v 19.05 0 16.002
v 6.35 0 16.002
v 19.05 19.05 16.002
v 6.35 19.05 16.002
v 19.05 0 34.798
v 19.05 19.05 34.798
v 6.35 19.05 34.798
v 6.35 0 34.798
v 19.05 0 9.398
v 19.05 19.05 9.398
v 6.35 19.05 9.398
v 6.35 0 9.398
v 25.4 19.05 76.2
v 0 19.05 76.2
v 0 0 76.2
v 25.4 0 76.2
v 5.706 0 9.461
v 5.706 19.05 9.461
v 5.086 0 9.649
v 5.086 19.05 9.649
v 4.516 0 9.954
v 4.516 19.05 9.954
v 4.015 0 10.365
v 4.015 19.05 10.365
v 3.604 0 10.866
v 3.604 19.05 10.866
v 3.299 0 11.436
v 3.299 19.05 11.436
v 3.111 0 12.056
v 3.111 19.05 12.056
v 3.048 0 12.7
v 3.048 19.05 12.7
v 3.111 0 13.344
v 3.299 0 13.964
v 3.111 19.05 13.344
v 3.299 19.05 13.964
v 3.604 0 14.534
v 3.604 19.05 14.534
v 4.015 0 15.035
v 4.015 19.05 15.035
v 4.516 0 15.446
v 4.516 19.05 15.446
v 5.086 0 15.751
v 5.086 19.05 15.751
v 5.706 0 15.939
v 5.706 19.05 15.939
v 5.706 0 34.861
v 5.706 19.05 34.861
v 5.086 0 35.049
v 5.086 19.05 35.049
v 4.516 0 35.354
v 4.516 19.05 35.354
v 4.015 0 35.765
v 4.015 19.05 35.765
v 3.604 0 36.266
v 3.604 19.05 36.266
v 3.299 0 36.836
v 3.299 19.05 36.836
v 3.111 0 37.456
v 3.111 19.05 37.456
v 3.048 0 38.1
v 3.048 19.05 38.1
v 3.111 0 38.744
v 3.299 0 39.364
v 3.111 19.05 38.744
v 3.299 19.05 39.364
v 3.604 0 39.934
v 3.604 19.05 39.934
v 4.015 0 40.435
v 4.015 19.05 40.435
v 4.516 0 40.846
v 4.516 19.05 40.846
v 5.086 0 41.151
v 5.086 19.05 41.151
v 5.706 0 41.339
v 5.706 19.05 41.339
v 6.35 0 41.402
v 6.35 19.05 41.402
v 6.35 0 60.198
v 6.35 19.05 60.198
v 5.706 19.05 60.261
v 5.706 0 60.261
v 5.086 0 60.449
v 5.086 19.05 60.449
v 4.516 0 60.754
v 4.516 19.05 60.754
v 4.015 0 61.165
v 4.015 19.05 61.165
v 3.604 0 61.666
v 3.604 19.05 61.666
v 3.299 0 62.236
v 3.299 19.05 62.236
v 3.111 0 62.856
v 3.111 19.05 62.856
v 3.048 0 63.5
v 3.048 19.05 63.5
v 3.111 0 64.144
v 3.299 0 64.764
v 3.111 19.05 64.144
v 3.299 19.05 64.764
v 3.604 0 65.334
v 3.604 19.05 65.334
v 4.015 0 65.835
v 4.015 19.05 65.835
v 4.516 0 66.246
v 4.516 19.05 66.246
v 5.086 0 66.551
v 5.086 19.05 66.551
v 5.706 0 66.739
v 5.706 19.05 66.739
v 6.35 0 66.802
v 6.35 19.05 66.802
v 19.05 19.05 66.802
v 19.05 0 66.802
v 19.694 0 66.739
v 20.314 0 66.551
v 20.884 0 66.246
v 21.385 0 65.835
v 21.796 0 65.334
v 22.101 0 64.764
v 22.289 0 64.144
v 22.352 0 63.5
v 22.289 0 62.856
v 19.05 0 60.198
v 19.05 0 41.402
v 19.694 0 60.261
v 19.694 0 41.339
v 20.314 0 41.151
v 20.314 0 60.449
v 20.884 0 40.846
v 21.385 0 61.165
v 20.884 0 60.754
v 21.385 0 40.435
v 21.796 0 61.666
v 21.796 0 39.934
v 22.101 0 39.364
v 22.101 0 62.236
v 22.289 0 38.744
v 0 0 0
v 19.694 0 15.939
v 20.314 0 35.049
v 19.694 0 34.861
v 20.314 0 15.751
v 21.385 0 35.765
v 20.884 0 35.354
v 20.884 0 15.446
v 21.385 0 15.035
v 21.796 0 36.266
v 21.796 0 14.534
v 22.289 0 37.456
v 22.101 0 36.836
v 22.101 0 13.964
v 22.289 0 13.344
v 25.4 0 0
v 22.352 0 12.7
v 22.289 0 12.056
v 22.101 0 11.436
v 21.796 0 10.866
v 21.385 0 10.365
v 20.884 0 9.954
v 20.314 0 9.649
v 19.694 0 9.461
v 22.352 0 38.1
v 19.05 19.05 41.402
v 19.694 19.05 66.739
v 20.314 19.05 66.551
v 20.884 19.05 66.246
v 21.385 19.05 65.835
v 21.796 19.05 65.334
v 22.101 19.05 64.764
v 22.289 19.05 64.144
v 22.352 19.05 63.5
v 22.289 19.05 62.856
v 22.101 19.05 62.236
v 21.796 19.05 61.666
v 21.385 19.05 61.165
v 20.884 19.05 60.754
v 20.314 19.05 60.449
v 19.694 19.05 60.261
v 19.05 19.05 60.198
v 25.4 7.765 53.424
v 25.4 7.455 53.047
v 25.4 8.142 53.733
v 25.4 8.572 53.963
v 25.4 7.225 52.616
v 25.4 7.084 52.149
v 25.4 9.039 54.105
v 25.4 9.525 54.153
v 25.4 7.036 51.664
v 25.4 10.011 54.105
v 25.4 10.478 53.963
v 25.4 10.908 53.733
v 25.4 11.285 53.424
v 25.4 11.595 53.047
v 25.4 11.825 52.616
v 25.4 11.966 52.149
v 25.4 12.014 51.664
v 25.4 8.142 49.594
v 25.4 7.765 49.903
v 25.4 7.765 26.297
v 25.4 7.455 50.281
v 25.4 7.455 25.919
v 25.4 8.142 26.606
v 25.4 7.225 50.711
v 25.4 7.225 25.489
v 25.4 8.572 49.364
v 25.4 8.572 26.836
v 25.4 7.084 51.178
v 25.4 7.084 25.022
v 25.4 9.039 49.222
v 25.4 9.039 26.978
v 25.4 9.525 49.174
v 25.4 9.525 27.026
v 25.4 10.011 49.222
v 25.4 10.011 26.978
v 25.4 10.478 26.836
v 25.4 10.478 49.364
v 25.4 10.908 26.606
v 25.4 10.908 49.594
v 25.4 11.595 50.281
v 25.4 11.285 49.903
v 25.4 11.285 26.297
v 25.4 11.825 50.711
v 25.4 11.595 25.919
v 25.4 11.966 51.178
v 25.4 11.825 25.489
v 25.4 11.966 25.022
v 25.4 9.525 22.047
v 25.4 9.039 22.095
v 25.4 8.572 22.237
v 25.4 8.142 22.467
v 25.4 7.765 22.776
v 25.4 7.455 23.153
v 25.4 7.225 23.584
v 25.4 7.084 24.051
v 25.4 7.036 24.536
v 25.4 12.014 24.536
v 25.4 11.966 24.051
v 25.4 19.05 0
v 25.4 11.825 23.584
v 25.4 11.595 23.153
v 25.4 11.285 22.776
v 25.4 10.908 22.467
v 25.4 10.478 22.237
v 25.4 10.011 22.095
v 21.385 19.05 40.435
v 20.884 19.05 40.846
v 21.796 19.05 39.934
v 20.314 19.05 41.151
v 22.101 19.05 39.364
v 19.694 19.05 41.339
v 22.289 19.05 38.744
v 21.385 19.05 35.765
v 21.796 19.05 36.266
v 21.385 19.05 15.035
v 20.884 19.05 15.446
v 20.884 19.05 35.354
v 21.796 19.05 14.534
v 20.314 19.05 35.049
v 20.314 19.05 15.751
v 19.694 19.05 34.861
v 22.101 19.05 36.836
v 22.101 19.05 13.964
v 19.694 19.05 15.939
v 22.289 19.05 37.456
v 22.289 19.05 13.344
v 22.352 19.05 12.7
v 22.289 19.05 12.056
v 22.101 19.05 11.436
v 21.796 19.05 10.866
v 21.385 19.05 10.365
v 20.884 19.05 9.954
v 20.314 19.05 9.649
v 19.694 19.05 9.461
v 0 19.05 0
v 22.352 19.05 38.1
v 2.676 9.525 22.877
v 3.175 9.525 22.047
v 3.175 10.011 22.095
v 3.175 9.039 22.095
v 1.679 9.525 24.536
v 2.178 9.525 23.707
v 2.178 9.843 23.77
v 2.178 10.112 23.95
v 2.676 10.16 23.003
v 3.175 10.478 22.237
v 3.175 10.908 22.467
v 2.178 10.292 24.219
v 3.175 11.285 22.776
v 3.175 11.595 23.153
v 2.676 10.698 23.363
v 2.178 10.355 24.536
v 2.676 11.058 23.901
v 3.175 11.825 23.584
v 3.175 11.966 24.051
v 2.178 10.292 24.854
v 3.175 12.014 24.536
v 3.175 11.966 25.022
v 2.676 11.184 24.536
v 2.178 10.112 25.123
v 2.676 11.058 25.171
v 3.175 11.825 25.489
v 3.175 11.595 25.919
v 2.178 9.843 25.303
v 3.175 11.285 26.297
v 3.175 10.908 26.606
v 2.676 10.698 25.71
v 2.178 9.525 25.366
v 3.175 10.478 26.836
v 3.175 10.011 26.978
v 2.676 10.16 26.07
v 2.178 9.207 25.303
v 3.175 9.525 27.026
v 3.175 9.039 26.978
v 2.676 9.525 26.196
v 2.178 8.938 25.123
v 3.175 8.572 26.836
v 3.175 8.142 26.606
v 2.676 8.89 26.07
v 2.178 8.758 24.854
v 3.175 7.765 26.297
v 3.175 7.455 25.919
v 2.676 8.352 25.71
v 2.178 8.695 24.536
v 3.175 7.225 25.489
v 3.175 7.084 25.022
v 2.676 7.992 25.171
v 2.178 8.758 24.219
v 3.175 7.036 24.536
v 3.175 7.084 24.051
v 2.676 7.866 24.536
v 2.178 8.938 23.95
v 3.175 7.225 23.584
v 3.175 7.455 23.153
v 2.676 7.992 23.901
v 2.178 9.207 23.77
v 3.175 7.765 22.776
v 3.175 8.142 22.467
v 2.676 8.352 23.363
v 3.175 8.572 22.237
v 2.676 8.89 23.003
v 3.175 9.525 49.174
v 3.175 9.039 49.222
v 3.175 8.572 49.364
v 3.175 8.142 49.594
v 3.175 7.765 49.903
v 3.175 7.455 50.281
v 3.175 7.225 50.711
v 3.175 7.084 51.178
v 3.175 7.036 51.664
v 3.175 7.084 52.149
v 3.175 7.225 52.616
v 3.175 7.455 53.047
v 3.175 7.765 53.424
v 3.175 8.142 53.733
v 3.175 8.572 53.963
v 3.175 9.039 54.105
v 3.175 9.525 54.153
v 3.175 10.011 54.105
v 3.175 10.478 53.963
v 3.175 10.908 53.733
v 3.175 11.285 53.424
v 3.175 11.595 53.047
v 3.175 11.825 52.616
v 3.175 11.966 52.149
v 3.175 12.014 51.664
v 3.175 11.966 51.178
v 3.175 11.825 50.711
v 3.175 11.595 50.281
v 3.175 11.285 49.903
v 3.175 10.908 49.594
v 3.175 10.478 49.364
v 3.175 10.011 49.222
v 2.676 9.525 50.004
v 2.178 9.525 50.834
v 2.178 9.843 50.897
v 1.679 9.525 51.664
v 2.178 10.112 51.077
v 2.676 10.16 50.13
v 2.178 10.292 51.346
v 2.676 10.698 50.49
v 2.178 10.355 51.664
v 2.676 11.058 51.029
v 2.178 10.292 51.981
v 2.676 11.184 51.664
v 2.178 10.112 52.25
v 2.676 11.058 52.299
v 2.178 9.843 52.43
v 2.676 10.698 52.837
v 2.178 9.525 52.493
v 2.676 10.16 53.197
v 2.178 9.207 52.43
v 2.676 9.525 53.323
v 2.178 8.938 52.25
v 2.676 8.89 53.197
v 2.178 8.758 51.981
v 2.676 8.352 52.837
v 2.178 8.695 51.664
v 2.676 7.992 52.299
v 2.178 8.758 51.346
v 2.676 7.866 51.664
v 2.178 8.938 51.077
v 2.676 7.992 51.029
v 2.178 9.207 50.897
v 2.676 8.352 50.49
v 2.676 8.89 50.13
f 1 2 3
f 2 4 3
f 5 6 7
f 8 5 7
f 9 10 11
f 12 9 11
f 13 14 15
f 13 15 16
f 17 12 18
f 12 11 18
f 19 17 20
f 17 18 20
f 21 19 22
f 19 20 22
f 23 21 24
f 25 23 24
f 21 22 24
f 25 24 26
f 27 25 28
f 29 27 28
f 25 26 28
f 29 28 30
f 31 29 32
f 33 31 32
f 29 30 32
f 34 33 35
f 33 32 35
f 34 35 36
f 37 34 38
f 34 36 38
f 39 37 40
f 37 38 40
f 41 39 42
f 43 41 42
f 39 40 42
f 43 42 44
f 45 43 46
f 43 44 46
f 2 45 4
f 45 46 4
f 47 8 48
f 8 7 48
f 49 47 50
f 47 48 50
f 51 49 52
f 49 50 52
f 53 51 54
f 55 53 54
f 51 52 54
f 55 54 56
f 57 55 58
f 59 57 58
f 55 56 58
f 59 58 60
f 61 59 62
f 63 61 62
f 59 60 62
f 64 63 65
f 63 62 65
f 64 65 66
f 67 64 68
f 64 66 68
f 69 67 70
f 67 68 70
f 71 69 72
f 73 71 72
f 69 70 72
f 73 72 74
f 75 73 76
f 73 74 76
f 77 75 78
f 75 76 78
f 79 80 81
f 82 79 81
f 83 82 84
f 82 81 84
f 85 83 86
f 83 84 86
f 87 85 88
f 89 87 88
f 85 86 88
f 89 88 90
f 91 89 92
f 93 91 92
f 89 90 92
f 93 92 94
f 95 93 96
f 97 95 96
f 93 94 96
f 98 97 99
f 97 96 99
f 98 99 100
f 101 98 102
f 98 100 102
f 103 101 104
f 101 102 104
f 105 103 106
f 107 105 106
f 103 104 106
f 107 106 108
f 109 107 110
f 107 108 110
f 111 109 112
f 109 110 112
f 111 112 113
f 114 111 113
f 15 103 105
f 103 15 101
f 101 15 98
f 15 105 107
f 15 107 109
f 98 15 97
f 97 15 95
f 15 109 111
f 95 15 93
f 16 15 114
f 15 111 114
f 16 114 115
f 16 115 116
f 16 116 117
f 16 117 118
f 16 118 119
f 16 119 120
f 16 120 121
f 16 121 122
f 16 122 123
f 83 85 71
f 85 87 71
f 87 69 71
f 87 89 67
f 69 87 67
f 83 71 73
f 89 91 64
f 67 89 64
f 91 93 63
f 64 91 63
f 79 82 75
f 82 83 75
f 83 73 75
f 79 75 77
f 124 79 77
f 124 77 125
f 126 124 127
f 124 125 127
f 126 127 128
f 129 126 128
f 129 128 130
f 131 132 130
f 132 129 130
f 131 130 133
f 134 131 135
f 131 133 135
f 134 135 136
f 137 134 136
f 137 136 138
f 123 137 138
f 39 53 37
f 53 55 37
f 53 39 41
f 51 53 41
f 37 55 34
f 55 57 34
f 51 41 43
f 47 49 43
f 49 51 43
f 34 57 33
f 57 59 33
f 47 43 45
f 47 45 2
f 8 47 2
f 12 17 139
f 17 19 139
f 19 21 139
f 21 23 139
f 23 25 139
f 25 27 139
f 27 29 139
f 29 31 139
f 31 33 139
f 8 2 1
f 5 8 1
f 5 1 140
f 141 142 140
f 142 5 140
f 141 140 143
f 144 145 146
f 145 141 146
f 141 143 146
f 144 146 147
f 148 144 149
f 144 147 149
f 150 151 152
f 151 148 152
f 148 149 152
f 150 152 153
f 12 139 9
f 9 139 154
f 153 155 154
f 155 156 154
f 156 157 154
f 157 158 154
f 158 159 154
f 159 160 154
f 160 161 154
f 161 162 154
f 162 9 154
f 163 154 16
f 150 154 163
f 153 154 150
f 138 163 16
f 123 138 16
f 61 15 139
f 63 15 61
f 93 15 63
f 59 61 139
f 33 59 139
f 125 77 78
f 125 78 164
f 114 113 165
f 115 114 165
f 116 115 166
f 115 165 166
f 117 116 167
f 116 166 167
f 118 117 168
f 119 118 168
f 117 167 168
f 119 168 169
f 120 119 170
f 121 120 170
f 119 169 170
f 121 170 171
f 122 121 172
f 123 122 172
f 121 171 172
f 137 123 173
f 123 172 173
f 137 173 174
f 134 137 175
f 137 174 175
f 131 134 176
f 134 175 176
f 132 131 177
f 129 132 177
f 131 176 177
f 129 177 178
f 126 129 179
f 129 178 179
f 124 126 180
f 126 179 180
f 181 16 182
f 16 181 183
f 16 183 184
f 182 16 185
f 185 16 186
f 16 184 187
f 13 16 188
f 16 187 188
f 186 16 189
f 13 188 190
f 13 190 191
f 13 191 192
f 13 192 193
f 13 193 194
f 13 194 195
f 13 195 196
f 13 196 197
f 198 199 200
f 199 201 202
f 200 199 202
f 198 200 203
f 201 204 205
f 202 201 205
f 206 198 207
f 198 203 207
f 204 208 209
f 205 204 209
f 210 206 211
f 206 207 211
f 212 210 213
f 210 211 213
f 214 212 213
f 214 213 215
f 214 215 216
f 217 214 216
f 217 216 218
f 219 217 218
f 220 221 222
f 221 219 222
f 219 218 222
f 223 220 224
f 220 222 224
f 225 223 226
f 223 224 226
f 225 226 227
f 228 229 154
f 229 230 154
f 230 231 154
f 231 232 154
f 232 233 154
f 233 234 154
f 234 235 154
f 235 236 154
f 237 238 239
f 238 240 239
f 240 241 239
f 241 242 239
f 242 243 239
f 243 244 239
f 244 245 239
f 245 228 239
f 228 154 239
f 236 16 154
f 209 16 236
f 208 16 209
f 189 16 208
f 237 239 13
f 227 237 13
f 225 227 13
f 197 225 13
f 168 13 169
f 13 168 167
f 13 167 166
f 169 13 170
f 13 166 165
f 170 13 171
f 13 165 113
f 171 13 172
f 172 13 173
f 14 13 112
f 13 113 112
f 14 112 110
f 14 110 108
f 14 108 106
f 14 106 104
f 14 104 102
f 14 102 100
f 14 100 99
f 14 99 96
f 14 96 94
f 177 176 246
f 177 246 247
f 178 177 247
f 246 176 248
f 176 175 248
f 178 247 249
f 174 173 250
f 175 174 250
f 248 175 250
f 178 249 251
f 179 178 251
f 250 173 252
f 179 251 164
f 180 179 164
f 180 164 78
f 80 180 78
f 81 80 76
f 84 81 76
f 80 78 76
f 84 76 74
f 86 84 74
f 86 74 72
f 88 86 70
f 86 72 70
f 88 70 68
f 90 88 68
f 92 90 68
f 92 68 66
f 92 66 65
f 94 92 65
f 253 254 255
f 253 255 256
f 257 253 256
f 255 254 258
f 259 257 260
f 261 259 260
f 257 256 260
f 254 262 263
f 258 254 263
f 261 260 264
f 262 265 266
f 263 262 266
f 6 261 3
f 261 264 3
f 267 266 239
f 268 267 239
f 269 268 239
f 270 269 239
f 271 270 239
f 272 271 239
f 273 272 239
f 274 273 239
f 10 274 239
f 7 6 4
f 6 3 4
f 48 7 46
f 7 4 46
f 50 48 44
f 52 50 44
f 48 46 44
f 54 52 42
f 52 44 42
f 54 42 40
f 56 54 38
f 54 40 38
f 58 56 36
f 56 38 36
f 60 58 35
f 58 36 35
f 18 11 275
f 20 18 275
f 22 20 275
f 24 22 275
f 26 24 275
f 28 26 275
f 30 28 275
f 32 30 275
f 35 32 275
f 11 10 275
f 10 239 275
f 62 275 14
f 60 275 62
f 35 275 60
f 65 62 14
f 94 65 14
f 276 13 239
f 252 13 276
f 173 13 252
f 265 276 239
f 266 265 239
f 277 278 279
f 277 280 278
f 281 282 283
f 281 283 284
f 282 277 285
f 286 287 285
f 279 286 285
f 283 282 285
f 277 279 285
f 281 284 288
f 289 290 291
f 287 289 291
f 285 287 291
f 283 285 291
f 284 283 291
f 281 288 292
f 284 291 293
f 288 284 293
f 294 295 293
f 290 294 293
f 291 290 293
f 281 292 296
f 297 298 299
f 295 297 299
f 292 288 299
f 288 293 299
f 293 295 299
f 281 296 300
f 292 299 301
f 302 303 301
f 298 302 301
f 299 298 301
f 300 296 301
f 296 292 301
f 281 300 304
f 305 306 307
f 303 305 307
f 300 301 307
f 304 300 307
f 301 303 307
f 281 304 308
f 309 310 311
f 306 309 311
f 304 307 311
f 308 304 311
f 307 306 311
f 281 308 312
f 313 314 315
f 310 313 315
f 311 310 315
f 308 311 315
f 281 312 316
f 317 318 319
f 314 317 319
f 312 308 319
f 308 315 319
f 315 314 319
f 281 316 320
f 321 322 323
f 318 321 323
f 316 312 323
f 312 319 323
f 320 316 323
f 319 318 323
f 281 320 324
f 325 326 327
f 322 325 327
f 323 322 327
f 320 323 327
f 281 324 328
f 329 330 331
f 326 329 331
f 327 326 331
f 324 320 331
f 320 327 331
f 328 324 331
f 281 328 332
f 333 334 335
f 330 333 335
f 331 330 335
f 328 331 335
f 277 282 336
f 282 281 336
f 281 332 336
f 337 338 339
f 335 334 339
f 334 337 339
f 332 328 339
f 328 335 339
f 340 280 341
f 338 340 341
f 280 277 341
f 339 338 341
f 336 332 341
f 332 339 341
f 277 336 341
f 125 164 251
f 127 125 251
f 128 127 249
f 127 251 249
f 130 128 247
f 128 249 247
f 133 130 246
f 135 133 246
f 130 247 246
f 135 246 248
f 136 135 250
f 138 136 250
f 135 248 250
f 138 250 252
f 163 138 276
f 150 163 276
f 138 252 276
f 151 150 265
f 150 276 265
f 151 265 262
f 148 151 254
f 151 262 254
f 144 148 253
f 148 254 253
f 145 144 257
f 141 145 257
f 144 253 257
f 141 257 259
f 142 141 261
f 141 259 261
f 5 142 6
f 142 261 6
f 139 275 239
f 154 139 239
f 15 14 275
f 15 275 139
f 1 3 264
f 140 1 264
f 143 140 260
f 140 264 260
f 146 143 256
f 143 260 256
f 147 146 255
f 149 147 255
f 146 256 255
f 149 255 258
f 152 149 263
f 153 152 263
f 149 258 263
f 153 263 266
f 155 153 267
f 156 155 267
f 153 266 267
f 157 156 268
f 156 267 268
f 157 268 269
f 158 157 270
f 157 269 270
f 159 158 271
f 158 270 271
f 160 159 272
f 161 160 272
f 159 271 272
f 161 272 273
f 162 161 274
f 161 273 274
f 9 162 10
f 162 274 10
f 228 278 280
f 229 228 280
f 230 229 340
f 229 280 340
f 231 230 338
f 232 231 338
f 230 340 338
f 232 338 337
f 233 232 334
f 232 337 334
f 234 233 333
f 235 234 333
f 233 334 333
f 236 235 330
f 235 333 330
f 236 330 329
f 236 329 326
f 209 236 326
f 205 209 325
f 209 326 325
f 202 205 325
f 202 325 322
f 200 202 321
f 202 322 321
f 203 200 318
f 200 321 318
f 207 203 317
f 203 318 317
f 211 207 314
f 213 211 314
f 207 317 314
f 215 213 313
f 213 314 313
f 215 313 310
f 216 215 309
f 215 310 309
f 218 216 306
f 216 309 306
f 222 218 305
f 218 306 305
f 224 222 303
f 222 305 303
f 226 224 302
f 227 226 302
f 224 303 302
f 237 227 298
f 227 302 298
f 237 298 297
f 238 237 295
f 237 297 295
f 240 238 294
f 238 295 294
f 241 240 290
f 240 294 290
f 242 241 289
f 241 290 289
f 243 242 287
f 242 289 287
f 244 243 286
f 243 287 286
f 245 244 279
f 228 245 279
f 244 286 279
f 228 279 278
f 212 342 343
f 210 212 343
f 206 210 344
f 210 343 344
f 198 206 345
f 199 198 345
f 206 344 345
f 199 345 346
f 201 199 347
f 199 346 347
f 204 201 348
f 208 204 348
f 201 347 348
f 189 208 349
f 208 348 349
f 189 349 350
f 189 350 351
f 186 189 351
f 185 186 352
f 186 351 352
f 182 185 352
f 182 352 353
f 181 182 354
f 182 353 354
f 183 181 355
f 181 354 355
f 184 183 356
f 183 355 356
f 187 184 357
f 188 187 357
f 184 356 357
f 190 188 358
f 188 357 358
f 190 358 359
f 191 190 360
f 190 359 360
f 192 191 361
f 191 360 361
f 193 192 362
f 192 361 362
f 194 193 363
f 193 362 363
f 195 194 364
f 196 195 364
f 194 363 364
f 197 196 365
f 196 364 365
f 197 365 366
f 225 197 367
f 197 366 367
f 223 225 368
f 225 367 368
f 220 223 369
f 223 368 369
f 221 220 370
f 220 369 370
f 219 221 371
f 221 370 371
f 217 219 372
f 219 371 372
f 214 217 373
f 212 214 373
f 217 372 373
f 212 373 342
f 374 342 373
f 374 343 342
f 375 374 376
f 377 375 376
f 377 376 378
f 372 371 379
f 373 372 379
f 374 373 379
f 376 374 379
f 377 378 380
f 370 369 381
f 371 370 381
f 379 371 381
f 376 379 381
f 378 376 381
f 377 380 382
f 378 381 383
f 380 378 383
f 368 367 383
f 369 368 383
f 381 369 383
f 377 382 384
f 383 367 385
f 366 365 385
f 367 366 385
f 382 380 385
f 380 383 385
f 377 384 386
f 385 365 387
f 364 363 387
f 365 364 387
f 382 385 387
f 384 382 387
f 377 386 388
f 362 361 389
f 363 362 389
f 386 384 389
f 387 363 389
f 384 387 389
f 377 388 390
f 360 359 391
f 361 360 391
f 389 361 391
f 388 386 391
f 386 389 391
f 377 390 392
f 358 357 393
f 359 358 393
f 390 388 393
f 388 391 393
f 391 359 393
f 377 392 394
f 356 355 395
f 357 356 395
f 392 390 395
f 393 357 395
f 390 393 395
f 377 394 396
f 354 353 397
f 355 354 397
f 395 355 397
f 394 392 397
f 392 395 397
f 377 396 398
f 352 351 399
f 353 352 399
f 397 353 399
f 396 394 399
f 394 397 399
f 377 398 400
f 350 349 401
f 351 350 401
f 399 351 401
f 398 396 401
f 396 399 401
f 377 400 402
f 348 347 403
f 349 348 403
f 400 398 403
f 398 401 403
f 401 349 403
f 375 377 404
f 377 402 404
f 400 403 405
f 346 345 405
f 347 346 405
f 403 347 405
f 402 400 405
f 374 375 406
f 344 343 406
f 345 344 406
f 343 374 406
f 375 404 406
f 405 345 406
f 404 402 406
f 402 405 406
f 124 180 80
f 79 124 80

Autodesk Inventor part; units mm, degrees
ref_plane "YZ Plane" through (0, 0, 0) normal (1, 0, 0) x (0, 1, 0)
ref_plane "XZ Plane" through (0, 0, 0) normal (0, 1, 0) x (-1, 0, 0)
ref_plane "XY Plane" through (0, 0, 0) normal (0, 0, 1) x (1, 0, 0)
sketch "Sketch1" plane through (0, 0, 0) normal (0, 0, 1) x (1, 0, 0)
  line L0 (0, 0) -> (25.4, 0)
  line L1 (25.4, 0) -> (25.4, 19.05)
  line L2 (25.4, 19.05) -> (0, 19.05)
  line L3 (0, 19.05) -> (0, 0)
  dimension "d0" = 25.4
  dimension "d1" = 19.05
extrude "Extrusion1" add sketch "Sketch1" along normal blind 76.2
sketch "Sketch2" plane through (25.4, 0, 0) normal (1, 0, 0) x (0, 0, -1)
  line L0 (0, 0) -> (0, 19.05) projected
  line L1 (0, 19.05) -> (-76.2, 19.05) projected
  point P0 (-51.6636, 9.525)
  point P1 (-24.5364, 9.525)
  dimension "d4" = 27.1272
  dimension "d6" = 9.525
  dimension "d7" = 9.525
  dimension "d29" = 24.5364
hole "Hole1" at (25.4, 9.525, 51.6636) at (25.4, 9.525, 24.5364) direction (-1, 0, 0) diameter 4.9784 depth 22.225 tip angle 118 thread size "1/4-20 UNC" class "2B" standard "ANSI Unified Screw Threads"
sketch "Sketch3" plane through (0, 19.05, 0) normal (0, 1, 0) x (1, 0, 0)
  line L0 (6.35, -12.7) -> (19.05, -12.7) construction
  line L1 (6.35, -16.002) -> (19.05, -16.002)
  line L2 (19.05, -9.398) -> (6.35, -9.398)
  arc A0 (6.35, -9.398) -> (6.35, -16.002) centre (6.35, -12.7) ccw
  arc A1 (19.05, -16.002) -> (19.05, -9.398) centre (19.05, -12.7) ccw
  line L3 (6.35, -63.5) -> (19.05, -63.5) construction
  line L4 (6.35, -66.802) -> (19.05, -66.802)
  line L5 (19.05, -60.198) -> (6.35, -60.198)
  arc A2 (6.35, -60.198) -> (6.35, -66.802) centre (6.35, -63.5) ccw
  arc A3 (19.05, -66.802) -> (19.05, -60.198) centre (19.05, -63.5) ccw
  line L6 (6.35, -38.1) -> (19.05, -38.1) construction
  line L7 (6.35, -41.402) -> (19.05, -41.402)
  line L8 (19.05, -34.798) -> (6.35, -34.798)
  arc A4 (6.35, -34.798) -> (6.35, -41.402) centre (6.35, -38.1) ccw
  arc A5 (19.05, -41.402) -> (19.05, -34.798) centre (19.05, -38.1) ccw
  line L9 (25.4, 0) -> (25.4, -76.2) projected
  line L10 (25.4, -76.2) -> (0, -76.2) projected
  point P0 (12.7, -12.7)
  point P1 (12.7, -63.5)
  point P2 (12.7, -38.1)
  dimension "d15" = 3.302
  dimension "d16" = 3.302
  dimension "d17" = 3.302
  dimension "d18" = 12.7
  dimension "d19" = 12.7
  dimension "d20" = 12.7
  dimension "d21" = 25.4
  dimension "d22" = 25.4
  dimension "d23" = 6.35
  dimension "d24" = 6.35
  dimension "d25" = 6.35
  dimension "d26" = 12.7
extrude "Extrusion2" cut sketch "Sketch3" against normal blind 101.6
properties part number "Motor Base" material "Aluminum 6061"
